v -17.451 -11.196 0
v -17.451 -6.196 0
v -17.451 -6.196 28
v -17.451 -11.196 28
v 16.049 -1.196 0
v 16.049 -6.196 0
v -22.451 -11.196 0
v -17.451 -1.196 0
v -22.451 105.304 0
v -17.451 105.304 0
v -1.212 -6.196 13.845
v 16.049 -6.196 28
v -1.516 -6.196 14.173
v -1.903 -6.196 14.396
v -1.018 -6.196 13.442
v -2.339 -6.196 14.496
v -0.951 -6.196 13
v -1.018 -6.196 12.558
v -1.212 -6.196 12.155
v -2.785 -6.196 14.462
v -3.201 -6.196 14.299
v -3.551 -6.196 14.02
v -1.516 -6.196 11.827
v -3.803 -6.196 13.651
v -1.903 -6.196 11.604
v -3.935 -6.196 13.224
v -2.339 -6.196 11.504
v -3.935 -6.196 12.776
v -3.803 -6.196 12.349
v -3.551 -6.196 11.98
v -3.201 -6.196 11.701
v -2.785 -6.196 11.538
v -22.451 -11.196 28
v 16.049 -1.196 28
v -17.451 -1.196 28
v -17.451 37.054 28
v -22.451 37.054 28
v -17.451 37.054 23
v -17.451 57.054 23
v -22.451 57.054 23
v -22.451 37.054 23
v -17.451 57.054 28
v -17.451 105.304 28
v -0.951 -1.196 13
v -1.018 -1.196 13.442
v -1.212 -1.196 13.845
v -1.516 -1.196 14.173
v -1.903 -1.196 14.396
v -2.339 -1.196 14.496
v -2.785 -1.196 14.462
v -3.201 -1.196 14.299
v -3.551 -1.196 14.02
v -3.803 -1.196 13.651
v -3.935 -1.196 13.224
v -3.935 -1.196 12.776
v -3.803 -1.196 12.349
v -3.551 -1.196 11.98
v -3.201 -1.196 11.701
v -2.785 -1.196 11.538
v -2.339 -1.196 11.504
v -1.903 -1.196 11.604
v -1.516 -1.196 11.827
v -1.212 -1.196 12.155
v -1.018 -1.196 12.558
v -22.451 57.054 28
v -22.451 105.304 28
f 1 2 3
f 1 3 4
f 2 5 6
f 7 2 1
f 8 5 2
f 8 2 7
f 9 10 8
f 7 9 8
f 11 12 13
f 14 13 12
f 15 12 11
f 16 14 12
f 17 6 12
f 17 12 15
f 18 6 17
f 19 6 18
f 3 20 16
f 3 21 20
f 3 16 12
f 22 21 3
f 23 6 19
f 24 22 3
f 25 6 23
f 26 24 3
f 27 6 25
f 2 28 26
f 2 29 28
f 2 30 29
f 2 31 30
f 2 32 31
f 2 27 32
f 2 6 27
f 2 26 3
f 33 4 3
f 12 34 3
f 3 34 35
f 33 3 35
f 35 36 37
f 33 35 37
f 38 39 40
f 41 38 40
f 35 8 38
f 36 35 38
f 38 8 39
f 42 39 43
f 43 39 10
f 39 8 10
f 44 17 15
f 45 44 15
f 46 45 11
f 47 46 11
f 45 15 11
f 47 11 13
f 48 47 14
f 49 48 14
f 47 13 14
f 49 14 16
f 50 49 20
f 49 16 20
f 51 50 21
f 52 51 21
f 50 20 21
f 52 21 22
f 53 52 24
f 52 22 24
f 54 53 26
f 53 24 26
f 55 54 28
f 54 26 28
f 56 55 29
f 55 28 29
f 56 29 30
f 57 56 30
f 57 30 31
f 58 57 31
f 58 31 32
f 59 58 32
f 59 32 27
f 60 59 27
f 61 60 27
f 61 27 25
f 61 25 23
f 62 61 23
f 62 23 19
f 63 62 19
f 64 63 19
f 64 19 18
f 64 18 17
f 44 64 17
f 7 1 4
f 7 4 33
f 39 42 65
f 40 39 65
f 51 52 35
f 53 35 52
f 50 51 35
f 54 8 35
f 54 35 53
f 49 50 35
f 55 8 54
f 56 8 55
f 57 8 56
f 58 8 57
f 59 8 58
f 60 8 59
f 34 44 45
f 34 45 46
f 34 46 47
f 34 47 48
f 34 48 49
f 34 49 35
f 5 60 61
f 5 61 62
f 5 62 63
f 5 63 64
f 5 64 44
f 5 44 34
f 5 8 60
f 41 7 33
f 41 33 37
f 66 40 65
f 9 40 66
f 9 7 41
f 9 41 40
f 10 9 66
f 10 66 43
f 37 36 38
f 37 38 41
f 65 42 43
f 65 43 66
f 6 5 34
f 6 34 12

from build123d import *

# Parameters (mm, degrees)
EXTRUDE_1_DEPTH     = 28
SKETCH_2_W          = 5
SKETCH_2_H          = 20
CUT_EXTRUDE_1_DEPTH = 5
SKETCH_3_R          = 1.5
CUT_EXTRUDE_2_DEPTH = 118.133742985


with BuildPart() as part:
    # 草圖1 → 填料-伸長1 (new body)
    with BuildSketch(Plane.XY):
        Polygon((-17.451364004, -6.196122823), (-17.451364004, -11.196122823), (-22.451364004, -11.196122823), (-22.451364004, 105.303877177), (-17.451364004, 105.303877177), (-17.451364004, 100.303877177), (-17.451364004, 95.303877177), (-17.451364004, -1.196122823), (16.048635996, -1.196122823), (16.048635996, -6.196122823), align=None)
    extrude(amount=EXTRUDE_1_DEPTH)

    # 草圖2 → 除料-伸長1 (cut)
    with BuildSketch(Plane(origin=(0, 0, 28), x_dir=(-1, 0, 0), z_dir=(0, 0, -1))):
        with Locations((19.951364004, 47.053877177)):
            Rectangle(SKETCH_2_W, SKETCH_2_H)
    extrude(amount=CUT_EXTRUDE_1_DEPTH, mode=Mode.SUBTRACT)

    # 草圖3 → 除料-伸長2 (cut, through all)
    with BuildSketch(Plane.XZ.offset(6.196122823)):
        with Locations((-2.451364004, 13)):
            Circle(SKETCH_3_R)
    extrude(amount=-CUT_EXTRUDE_2_DEPTH, mode=Mode.SUBTRACT)


solid = part.part
